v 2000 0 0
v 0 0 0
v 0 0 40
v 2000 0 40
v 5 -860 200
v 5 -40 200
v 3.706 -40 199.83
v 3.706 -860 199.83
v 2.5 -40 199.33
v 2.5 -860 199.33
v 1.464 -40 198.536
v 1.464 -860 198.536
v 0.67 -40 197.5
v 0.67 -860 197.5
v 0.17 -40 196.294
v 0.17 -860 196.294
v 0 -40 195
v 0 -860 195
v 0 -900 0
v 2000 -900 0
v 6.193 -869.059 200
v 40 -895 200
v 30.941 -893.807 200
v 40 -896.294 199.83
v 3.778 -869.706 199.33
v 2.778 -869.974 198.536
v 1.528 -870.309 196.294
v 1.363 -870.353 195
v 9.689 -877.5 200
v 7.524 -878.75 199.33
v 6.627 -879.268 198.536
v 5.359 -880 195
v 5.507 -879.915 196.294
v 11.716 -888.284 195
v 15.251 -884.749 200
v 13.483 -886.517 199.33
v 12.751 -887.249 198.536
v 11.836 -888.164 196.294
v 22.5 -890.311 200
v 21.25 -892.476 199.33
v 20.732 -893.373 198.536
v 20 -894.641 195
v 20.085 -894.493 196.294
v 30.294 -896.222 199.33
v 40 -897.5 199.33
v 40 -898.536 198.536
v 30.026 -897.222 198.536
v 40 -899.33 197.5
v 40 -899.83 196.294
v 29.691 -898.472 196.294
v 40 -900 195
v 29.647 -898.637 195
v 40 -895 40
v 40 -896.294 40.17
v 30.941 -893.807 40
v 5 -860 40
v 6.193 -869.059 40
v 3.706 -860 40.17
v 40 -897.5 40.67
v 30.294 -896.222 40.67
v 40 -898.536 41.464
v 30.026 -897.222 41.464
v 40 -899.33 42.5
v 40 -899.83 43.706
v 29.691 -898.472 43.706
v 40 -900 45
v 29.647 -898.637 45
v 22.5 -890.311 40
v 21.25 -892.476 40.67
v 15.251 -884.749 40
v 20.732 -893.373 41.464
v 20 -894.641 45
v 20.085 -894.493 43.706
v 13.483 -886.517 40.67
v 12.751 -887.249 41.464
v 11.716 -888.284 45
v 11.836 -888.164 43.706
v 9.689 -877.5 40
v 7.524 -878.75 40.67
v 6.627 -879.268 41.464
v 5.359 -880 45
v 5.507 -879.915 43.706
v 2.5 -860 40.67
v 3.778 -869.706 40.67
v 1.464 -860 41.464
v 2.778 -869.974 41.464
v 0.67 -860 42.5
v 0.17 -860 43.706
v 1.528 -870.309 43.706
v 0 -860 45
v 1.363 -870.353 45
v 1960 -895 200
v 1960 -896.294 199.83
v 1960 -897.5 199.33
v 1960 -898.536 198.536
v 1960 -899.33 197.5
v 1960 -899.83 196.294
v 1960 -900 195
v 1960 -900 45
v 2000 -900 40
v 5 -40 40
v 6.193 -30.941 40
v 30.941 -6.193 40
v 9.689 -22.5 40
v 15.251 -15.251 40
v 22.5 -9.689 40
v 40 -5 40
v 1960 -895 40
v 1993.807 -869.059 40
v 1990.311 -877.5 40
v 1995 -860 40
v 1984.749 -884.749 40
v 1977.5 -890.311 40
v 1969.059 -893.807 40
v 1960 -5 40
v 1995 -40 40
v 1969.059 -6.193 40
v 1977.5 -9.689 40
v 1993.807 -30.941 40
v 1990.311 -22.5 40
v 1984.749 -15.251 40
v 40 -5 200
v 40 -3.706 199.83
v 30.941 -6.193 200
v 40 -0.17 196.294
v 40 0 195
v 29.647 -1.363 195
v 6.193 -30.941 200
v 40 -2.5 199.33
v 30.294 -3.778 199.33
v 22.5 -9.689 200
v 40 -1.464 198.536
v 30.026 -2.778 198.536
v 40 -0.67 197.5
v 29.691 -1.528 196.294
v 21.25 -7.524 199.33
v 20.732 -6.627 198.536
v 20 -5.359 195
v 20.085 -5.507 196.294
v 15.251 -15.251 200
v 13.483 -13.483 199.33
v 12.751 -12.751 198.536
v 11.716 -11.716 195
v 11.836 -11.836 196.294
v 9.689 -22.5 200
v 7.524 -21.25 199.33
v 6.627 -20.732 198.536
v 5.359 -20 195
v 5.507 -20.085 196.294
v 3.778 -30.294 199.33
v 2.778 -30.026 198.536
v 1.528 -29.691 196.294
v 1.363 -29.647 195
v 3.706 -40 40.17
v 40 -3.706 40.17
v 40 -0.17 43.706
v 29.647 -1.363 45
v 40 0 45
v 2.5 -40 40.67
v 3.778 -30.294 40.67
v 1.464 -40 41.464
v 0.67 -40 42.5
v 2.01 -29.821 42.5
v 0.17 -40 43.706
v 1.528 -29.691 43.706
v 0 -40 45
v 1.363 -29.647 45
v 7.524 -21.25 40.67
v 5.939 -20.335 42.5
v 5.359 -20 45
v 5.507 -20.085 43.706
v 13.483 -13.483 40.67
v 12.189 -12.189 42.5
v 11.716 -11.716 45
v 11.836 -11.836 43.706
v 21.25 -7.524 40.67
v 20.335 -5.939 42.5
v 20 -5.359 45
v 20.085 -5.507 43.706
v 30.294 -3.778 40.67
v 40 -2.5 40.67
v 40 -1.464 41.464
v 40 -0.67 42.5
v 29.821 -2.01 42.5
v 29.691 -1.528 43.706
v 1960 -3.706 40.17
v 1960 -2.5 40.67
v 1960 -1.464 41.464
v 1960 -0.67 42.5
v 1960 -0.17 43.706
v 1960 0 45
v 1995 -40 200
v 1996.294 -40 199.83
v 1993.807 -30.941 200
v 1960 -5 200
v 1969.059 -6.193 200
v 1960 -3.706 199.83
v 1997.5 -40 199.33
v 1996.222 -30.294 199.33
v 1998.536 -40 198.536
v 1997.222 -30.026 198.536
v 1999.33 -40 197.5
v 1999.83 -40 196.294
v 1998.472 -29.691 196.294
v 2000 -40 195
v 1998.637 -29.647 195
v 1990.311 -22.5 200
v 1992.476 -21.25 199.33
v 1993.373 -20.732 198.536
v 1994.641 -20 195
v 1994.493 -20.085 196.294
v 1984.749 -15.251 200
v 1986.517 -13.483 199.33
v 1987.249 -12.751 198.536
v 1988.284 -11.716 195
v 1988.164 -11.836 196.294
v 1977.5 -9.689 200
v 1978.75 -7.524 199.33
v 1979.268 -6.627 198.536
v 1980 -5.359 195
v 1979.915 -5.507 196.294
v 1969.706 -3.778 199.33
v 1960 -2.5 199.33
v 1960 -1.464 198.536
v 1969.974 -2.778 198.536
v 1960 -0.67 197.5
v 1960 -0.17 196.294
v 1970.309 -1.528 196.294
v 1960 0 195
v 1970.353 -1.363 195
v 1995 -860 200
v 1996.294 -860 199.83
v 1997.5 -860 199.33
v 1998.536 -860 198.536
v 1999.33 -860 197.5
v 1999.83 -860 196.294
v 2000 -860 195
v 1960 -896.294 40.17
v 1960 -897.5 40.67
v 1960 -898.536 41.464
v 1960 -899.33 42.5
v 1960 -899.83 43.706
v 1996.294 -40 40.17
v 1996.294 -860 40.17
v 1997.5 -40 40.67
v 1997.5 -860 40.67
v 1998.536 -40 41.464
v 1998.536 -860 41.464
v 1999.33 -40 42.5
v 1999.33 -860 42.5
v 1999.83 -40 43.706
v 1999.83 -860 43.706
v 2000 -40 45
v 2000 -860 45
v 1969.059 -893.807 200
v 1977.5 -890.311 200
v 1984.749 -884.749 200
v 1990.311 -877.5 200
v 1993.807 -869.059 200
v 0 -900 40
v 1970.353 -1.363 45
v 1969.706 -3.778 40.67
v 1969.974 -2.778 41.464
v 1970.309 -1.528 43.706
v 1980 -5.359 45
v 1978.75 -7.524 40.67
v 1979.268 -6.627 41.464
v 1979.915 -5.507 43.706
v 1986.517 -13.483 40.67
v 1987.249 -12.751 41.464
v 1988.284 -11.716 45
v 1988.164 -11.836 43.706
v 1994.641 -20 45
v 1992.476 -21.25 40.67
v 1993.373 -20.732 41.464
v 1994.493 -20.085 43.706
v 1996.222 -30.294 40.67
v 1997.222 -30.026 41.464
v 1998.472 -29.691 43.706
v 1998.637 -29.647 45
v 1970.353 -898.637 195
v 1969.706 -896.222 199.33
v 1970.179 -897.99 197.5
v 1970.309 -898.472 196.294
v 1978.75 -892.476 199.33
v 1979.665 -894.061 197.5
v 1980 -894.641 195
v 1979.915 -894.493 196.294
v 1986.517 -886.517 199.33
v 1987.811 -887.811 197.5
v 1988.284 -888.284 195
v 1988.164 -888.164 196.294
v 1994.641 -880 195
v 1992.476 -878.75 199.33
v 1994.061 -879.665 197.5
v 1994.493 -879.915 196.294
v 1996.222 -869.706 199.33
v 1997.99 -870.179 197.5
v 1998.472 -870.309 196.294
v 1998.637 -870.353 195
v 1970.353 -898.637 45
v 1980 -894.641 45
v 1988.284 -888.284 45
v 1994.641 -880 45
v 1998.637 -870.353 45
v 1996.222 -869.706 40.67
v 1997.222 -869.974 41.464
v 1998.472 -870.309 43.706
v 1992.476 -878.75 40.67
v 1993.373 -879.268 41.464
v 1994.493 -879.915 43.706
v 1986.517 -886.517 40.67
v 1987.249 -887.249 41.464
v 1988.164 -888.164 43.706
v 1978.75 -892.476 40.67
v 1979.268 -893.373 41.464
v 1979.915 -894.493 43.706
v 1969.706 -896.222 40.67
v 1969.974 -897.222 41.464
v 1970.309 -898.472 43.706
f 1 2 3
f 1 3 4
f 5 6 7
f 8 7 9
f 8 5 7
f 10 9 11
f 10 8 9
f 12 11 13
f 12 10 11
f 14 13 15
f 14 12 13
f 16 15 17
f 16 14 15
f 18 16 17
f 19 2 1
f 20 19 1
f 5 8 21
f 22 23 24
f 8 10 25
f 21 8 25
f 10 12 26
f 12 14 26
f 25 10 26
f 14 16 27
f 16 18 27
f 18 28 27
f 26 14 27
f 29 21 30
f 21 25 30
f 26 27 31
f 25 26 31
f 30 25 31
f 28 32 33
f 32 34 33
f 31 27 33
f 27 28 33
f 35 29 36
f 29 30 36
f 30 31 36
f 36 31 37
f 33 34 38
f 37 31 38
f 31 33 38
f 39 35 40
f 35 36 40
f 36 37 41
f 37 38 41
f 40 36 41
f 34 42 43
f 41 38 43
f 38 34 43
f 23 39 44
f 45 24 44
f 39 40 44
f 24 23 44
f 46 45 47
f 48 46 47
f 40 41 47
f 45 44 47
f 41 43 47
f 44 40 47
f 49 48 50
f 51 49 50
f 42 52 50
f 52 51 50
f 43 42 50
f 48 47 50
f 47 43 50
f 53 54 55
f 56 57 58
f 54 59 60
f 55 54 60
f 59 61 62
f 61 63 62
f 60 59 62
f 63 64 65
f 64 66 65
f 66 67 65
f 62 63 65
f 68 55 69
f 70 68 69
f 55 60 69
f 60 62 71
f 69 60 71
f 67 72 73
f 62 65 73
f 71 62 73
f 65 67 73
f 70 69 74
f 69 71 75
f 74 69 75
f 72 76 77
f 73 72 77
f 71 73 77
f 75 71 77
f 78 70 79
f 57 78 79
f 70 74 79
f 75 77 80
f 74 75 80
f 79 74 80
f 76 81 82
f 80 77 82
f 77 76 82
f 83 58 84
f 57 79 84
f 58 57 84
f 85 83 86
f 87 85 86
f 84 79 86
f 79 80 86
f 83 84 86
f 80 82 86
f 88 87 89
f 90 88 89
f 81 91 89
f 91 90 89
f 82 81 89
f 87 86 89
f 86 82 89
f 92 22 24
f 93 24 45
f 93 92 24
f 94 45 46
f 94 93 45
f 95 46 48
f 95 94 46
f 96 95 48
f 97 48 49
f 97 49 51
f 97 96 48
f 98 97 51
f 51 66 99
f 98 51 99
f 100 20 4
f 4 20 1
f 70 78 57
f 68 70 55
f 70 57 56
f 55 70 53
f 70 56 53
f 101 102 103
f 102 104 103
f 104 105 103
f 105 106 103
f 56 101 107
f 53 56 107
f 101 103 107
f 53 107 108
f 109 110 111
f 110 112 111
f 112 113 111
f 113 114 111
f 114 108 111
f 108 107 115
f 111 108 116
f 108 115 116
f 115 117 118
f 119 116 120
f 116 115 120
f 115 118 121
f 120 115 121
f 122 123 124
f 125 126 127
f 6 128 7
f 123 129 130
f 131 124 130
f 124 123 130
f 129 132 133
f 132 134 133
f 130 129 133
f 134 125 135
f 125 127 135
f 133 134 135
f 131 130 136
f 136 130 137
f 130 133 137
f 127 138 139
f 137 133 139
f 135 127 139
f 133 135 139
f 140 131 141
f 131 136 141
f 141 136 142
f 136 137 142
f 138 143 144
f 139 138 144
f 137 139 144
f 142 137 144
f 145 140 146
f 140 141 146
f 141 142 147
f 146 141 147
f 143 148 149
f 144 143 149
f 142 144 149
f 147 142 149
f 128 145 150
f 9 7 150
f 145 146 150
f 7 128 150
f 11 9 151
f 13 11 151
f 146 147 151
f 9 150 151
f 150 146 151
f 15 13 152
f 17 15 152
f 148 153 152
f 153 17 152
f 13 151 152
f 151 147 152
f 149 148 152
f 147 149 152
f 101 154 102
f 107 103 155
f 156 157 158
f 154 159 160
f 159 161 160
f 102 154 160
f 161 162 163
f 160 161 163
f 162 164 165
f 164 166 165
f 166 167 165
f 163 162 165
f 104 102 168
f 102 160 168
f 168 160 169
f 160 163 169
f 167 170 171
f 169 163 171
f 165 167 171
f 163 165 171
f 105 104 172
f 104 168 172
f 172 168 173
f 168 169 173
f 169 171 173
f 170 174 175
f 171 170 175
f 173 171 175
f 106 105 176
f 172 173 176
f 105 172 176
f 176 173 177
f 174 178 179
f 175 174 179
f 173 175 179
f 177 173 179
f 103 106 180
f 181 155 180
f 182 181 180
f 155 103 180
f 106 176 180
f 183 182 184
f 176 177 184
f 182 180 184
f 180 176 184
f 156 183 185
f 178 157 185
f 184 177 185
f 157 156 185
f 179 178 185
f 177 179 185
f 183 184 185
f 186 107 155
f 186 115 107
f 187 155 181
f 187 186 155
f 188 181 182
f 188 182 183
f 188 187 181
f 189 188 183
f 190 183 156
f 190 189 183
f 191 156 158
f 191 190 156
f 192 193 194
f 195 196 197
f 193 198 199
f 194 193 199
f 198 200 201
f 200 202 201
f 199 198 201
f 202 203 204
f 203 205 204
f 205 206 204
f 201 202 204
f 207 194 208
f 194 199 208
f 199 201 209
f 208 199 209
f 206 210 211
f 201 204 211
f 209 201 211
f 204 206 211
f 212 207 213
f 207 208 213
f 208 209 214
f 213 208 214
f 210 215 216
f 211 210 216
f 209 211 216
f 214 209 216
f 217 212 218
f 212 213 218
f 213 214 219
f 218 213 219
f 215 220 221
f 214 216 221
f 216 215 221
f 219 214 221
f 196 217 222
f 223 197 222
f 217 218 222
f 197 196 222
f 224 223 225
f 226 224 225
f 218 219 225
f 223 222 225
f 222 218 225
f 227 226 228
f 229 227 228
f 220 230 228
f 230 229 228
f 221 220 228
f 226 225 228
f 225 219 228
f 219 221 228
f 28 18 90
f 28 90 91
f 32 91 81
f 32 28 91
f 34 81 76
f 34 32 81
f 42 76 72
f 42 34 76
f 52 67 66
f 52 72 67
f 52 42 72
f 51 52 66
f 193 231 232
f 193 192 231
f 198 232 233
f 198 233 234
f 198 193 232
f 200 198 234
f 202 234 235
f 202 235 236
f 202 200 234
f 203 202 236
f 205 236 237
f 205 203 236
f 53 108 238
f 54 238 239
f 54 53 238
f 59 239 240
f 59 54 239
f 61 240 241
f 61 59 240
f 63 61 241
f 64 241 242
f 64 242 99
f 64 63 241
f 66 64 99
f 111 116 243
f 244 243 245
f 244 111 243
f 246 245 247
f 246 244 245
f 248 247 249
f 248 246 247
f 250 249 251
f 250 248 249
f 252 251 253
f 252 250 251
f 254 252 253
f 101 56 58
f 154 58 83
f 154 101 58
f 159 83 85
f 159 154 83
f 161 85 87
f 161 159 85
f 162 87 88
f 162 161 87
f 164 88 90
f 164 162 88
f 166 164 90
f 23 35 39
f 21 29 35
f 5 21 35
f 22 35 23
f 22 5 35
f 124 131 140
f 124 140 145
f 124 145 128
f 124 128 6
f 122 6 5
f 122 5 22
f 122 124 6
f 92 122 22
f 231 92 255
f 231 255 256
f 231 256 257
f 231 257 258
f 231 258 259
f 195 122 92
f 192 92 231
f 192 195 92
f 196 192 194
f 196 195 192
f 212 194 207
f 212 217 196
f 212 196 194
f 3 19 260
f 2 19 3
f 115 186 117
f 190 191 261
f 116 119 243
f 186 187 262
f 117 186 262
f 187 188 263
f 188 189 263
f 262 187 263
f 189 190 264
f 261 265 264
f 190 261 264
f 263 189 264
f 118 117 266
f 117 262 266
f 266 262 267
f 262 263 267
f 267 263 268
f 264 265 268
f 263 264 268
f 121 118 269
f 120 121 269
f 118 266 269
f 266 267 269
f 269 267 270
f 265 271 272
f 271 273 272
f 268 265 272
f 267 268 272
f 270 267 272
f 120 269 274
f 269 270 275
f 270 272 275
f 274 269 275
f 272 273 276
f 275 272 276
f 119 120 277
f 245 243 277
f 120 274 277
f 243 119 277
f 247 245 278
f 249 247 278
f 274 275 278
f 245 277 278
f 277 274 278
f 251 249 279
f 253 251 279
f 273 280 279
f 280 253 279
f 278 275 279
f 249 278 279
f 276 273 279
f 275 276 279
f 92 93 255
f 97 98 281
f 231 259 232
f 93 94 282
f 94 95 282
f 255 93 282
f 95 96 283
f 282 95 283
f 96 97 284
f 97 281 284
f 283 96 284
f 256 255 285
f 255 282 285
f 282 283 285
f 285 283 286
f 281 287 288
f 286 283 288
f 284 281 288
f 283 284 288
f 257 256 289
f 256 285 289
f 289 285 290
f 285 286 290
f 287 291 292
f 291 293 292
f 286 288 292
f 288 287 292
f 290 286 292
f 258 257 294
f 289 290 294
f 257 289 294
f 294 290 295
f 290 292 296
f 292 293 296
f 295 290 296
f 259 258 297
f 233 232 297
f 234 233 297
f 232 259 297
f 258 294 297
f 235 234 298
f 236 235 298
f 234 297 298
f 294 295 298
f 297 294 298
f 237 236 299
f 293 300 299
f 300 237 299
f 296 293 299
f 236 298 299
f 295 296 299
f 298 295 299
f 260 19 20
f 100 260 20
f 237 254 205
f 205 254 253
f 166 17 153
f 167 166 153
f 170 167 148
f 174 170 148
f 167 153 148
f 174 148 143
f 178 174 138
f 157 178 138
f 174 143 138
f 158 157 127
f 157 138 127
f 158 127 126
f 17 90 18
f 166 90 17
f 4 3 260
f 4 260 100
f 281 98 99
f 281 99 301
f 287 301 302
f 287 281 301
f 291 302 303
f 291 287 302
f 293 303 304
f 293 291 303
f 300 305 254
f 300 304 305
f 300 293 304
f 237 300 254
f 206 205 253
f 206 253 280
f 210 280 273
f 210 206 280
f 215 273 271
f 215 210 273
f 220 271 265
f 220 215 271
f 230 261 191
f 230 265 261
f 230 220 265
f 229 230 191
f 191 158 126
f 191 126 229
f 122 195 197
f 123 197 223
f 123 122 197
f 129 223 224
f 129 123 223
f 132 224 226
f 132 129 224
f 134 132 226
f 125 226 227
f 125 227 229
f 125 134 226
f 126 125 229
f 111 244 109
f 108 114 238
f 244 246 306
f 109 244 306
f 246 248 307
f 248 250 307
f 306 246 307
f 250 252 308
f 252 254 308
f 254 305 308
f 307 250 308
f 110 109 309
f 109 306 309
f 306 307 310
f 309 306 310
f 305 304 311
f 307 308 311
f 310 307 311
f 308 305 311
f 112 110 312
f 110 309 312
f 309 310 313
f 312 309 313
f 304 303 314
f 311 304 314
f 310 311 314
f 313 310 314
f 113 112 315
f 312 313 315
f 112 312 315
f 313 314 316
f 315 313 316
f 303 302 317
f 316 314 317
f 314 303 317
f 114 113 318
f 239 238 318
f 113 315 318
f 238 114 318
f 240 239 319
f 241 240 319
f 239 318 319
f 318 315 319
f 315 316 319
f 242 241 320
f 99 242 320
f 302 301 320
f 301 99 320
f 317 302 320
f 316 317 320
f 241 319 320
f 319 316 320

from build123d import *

# Parameters (mm, degrees)
F0_W     = 2000
F0_H     = 900
F1_DEPTH = 40
F2_DEPTH = 160
F3_R     = 40
F4_R     = 5


with BuildPart() as f1:
    # F0 (on Top) → F1 (new body)
    with BuildSketch(Plane.XY):
        with Locations((1000, -450)):
            Rectangle(F0_W, F0_H)
    extrude(amount=F1_DEPTH)


with BuildPart() as f2:
    # F2 (new): a face of the model
    f2_faces = [f1.part.faces().sort_by_distance(p)[0] for p in [
        (1000, -450, 40),
    ]]
    extrude(f2_faces, amount=F2_DEPTH)

    # F3
    f3_edges = [f2.edges().sort_by_distance(p)[0] for p in [
        (0, -900, 120),
        (0, 0, 120),
        (2000, -900, 120),
        (2000, 0, 120),
    ]]
    fillet(f3_edges, radius=F3_R)

    # F4
    f4_edges = [f2.edges().sort_by_distance(p)[0] for p in [
        (2000, -450, 200),
        (0, -450, 200),
        (1000, 0, 40),
        (1000, 0, 200),
        (1000, -900, 200),
        (1988.284271, -11.715729, 200),
        (40, -900, 120),
        (0, -860, 120),
        (2000, -450, 40),
        (11.715729, -11.715729, 200),
        (0, -450, 40),
        (11.715729, -888.284271, 40),
        (40, 0, 120),
        (1988.284271, -11.715729, 40),
        (0, -40, 120),
        (1960, 0, 120),
        (2000, -40, 120),
        (11.715729, -888.284271, 200),
        (1000, -900, 40),
        (11.715729, -11.715729, 40),
        (2000, -860, 120),
        (1988.284271, -888.284271, 200),
        (1988.284271, -888.284271, 40),
        (1960, -900, 120),
    ]]
    fillet(f4_edges, radius=F4_R)


solid = Compound([f1.part, f2.part])
